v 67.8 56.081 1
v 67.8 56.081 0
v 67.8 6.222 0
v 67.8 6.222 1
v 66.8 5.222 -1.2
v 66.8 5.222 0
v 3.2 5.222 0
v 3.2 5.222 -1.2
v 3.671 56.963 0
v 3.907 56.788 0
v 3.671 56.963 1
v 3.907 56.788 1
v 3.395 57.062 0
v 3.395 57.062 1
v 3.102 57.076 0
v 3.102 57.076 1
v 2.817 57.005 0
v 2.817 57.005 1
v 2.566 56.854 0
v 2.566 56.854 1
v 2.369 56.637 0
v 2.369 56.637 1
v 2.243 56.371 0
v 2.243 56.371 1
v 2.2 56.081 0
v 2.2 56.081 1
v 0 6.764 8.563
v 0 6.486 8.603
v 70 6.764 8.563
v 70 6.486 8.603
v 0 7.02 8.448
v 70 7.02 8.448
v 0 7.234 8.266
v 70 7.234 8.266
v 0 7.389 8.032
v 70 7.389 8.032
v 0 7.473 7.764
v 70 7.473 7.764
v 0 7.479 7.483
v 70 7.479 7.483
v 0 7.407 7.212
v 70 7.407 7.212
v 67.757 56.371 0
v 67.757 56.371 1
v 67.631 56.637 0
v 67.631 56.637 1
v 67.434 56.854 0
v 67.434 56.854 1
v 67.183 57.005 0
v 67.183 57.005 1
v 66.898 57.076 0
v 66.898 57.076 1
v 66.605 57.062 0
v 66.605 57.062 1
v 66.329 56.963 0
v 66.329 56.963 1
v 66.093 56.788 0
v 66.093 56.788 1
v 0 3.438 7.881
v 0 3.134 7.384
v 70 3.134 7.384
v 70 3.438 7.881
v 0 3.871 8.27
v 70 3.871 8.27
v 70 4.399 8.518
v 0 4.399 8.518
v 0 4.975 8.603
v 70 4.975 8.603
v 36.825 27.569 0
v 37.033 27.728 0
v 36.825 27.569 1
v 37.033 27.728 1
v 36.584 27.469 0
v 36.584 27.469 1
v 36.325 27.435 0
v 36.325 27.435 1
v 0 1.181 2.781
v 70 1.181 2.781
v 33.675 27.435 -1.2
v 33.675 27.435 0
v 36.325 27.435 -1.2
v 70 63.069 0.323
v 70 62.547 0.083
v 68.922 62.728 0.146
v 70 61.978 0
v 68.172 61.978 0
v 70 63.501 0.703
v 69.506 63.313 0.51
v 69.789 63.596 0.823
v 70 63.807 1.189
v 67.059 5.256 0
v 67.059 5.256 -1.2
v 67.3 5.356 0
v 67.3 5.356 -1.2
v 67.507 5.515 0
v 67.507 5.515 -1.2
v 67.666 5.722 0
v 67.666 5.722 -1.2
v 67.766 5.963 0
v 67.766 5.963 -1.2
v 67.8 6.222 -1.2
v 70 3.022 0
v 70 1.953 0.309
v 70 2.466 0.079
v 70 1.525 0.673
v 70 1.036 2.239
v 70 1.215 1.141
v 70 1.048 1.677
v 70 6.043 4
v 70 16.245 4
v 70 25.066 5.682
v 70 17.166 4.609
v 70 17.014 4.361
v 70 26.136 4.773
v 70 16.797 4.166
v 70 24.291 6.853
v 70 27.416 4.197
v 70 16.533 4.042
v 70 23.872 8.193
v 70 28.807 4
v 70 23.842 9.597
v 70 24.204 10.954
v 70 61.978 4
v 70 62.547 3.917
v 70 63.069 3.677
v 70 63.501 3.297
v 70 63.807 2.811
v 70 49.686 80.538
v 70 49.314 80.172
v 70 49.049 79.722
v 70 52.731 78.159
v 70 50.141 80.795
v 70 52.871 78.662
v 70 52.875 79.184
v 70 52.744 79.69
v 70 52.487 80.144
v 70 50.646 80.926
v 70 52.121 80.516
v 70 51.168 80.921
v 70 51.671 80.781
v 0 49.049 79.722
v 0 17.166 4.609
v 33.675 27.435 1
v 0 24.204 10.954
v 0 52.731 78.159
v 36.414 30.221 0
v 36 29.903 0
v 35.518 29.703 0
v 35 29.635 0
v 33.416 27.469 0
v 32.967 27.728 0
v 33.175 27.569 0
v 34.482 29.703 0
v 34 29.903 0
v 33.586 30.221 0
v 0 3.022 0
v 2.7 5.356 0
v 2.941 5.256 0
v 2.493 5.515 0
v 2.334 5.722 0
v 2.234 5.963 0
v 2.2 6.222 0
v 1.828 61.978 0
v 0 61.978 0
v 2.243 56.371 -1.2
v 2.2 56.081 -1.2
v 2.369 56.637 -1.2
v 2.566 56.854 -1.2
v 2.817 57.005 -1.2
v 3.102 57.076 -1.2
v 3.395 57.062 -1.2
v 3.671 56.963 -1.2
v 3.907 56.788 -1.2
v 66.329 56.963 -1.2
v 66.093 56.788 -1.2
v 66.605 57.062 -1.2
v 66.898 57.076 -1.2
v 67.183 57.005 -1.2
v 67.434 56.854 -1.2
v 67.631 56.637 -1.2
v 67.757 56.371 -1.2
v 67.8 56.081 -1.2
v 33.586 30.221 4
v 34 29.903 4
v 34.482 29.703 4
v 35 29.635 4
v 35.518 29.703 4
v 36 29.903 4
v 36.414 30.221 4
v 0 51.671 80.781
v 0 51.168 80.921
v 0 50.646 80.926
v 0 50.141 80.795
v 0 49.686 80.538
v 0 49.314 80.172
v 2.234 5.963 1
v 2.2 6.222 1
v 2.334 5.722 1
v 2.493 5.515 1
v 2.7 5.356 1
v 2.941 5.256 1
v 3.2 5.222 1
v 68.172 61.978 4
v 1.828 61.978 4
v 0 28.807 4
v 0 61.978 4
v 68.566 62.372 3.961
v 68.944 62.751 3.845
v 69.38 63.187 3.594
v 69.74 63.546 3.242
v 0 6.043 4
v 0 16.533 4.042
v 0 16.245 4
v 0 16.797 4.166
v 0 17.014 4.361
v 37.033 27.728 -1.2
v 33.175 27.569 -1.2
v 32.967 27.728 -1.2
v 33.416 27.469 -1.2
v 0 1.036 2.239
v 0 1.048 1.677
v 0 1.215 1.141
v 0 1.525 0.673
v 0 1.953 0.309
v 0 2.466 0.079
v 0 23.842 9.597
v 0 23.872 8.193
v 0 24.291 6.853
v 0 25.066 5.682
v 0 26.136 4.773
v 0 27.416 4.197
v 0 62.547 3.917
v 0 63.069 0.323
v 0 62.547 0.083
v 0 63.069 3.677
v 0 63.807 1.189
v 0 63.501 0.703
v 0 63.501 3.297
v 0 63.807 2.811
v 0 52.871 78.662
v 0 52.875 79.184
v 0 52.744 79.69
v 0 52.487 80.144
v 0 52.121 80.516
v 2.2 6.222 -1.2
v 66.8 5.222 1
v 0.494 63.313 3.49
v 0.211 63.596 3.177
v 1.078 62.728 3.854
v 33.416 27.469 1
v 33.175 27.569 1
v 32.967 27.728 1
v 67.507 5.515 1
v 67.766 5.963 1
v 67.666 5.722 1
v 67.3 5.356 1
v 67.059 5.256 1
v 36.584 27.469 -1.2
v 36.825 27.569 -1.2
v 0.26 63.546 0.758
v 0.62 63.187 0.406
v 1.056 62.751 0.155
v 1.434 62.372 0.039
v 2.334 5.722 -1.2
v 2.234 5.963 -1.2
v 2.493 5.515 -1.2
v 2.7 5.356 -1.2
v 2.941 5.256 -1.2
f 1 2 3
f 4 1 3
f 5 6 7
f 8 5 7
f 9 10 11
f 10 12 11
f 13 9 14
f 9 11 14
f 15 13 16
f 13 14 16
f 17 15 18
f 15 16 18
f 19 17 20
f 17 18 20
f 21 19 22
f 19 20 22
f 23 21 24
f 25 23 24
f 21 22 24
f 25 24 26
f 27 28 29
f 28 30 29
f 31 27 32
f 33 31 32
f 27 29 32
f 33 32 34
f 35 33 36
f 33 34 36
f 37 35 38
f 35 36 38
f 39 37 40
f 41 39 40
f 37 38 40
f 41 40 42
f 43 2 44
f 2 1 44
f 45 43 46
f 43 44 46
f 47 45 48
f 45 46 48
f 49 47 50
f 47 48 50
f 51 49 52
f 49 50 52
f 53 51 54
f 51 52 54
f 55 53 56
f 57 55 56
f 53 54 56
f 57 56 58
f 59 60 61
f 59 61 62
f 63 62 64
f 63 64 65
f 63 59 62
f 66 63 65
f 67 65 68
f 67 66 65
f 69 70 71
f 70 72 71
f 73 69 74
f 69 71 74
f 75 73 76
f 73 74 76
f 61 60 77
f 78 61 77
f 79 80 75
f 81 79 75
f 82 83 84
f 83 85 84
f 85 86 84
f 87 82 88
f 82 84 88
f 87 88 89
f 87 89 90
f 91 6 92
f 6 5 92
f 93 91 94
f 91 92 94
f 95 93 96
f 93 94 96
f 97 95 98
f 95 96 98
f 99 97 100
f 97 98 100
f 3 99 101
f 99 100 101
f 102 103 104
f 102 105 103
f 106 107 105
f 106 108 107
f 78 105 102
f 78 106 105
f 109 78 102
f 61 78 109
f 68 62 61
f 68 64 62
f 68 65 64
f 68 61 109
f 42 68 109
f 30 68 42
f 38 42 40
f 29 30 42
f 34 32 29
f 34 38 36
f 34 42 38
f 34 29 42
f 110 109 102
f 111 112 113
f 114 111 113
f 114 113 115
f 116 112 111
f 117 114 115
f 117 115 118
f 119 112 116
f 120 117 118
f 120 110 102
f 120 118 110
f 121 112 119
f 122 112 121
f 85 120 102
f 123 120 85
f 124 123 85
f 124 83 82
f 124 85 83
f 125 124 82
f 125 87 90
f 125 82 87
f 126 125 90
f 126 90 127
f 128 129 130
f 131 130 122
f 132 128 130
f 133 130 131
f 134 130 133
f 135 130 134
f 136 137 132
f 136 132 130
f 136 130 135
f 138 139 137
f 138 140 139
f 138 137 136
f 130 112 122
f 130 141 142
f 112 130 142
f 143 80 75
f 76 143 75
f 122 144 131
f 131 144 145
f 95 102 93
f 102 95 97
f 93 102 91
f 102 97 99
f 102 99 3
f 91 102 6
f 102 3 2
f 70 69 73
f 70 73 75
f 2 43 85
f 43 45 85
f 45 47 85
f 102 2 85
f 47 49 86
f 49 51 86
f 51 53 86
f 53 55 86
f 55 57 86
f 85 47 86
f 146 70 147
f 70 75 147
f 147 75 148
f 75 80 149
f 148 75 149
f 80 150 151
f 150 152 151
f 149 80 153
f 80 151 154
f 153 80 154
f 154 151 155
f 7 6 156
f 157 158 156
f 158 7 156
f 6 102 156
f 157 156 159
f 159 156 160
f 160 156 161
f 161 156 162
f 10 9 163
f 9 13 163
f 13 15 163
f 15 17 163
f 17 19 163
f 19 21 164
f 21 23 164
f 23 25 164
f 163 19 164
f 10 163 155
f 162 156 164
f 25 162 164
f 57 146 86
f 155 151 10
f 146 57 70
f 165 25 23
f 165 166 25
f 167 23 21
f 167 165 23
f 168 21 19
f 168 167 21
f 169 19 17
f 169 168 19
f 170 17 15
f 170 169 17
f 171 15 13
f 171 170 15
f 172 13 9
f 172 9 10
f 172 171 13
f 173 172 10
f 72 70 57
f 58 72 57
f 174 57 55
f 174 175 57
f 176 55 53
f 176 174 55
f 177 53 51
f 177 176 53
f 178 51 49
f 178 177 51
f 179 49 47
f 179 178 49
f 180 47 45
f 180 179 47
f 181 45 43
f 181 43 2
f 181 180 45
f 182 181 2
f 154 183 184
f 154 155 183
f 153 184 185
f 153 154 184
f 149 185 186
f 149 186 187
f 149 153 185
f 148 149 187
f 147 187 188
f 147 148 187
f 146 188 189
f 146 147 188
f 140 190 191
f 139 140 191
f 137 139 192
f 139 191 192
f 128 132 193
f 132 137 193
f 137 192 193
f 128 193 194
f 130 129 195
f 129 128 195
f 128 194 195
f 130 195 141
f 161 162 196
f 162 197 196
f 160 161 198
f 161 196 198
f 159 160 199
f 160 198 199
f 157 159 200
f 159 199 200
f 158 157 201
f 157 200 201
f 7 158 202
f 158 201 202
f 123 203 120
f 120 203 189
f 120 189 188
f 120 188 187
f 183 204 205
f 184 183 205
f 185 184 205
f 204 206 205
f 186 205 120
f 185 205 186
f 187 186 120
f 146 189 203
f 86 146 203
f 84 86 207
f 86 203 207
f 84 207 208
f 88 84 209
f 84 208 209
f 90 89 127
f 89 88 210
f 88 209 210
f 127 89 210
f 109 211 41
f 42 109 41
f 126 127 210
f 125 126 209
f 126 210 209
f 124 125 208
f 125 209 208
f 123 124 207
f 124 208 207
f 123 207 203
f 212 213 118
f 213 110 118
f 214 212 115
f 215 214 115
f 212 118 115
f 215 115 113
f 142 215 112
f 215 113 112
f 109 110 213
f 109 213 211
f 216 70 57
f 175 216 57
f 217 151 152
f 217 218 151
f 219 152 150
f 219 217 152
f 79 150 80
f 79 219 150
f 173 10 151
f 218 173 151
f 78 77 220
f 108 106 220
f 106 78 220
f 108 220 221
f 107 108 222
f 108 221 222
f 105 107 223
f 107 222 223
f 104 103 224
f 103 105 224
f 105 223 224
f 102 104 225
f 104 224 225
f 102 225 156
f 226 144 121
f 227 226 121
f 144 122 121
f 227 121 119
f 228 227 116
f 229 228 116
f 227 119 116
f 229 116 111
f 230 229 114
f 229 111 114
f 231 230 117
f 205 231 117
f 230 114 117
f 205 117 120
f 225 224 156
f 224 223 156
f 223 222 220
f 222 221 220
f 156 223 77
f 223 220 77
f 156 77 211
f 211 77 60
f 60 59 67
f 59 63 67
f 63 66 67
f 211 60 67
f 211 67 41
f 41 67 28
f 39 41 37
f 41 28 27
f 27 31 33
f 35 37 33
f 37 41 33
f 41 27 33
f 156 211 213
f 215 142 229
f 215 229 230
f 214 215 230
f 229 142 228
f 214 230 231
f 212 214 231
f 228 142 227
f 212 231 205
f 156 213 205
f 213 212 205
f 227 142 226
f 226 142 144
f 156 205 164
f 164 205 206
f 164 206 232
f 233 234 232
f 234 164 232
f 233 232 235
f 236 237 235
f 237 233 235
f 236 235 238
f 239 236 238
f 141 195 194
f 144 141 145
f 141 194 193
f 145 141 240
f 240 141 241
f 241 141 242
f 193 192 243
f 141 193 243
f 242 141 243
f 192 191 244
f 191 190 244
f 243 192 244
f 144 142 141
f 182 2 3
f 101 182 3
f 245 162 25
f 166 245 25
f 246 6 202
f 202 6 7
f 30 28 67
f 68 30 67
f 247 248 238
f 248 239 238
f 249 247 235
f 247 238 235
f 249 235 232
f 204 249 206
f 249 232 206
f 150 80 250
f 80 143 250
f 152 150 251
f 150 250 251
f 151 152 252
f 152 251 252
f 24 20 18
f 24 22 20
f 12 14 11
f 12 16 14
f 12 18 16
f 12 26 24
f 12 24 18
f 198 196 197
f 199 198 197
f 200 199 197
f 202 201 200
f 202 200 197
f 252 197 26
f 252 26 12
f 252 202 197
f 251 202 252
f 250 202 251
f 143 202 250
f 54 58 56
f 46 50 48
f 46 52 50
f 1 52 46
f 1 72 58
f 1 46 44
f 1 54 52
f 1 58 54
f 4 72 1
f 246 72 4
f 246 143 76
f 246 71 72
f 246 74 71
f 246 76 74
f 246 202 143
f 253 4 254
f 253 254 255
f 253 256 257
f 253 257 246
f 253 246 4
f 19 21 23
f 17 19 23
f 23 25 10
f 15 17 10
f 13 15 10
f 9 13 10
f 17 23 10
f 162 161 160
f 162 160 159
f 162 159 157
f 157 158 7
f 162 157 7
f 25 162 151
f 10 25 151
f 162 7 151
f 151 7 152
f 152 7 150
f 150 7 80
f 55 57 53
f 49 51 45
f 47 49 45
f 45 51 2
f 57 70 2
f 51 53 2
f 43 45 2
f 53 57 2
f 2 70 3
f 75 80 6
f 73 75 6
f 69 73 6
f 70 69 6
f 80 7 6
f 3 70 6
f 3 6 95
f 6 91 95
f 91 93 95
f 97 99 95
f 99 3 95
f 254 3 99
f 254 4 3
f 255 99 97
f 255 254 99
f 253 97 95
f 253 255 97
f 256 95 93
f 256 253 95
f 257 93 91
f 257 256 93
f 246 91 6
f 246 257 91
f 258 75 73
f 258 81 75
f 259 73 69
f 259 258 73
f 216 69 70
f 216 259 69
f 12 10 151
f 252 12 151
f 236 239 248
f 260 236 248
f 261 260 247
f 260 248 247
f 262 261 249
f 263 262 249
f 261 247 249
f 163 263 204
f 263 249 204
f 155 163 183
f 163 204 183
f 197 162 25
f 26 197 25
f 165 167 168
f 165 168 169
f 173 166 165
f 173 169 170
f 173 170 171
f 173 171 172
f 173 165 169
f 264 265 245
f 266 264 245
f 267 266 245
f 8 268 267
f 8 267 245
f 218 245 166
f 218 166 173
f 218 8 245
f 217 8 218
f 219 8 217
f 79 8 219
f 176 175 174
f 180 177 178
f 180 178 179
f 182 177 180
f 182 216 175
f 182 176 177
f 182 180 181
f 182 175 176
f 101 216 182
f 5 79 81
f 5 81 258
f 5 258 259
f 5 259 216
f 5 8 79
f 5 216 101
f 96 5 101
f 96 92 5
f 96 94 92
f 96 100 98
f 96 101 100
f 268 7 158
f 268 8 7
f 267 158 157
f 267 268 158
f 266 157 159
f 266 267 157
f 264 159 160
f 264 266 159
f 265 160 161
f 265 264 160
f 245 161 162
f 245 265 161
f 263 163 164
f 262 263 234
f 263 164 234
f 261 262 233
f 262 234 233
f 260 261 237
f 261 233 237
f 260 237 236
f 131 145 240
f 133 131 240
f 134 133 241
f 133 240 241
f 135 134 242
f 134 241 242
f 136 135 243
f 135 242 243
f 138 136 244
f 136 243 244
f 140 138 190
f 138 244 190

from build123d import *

# Parameters (mm, degrees)
F1_DEPTH    = 70
F2_T1_DEPTH = 80
F2_T3_DEPTH = 76.618855612
F2_T5_DEPTH = 85.1083519361
F3_R        = 1
F4_R        = 5
F6_DEPTH    = 4
F7_R        = 2
F9_DEPTH    = 1
F10_DEPTH   = 1.2
F11_R       = 1
F11_2_R     = 1


# Not quite as in the source:
# - a fillet or chamfer that OpenCascade refuses, or shapes differently, is made with other operations: its cross-section is extruded or revolved along the edge and cut away or added
# - two fillets or chamfers of one size are made in one step


with BuildPart() as f1:
    # F0 (on Right) → F1 (new body)
    with BuildSketch(Plane.YZ):
        Polygon((3.6515549073, 8.6025242673), (0, 0), (65, 0), (63.3021007352, 4), (21.2523860581, 4), (53.5124720901, 80), (49.8304526763, 81.562924514), (16.9069445485, 4), (6.0433407745, 4), (7.9969964169, 8.6025242673), align=None)
    extrude(amount=F1_DEPTH)

    # F2: fillet of radius 2 on 6 edges, made by hand

    # F2_s2 → F2_t1 (cut)
    with BuildSketch(Plane.YZ.offset(-5)):
        with BuildLine():
            ThreePointArc((51.6714623832, 80.781462257), (50.1407869393, 80.7948202592), (49.0489904193, 79.7219148071))
            Line((49.0489904193, 79.7219148071), (49.8304526763, 81.562924514))
            Line((49.8304526763, 81.562924514), (51.6714623832, 80.781462257))
        make_face()
        with BuildLine():
            ThreePointArc((52.7310098331, 78.1589902931), (52.7443678353, 79.6896657369), (51.6714623832, 80.781462257))
            Line((51.6714623832, 80.781462257), (53.5124720901, 80))
            Line((53.5124720901, 80), (52.7310098331, 78.1589902931))
        make_face()
    extrude(amount=F2_T1_DEPTH, mode=Mode.SUBTRACT)

    # F2_s4 → F2_t3 (cut)
    with BuildSketch(Plane.YZ.offset(-3.309427806)):
        with BuildLine():
            ThreePointArc((3.1343163228, 7.3839865242), (3.8714520591, 8.2702959114), (4.9753260297, 8.6025242673))
            Line((4.9753260297, 8.6025242673), (3.6515549073, 8.6025242673))
            Line((3.6515549073, 8.6025242673), (3.1343163228, 7.3839865242))
        make_face()
        with BuildLine():
            ThreePointArc((63.8193393197, 2.781462257), (63.0822035834, 3.6677716441), (61.9783296128, 4))
            Line((61.9783296128, 4), (63.3021007352, 4))
            Line((63.3021007352, 4), (63.8193393197, 2.781462257))
        make_face()
    extrude(amount=F2_T3_DEPTH, mode=Mode.SUBTRACT)

    # F2_s6 → F2_t5 (cut)
    with BuildSketch(Plane.YZ.offset(-7.5541759681)):
        with BuildLine():
            ThreePointArc((1.1806606803, 2.781462257), (1.3538987431, 0.8961260294), (3.0216703872, 0))
            Line((3.0216703872, 0), (0, 0))
            Line((0, 0), (1.1806606803, 2.781462257))
        make_face()
        with BuildLine():
            ThreePointArc((61.9783296128, 0), (63.6461012569, 0.8961260294), (63.8193393197, 2.781462257))
            Line((63.8193393197, 2.781462257), (65, 0))
            Line((65, 0), (61.9783296128, 0))
        make_face()
    extrude(amount=F2_T5_DEPTH, mode=Mode.SUBTRACT)

    # F3
    f3_edges = [f1.edges().sort_by_distance(p)[0] for p in [
        (35, 7.996996, 8.602524),
        (35, 16.906945, 4),
    ]]
    fillet(f3_edges, radius=F3_R)

    # F4
    f4_edges = [f1.edges().sort_by_distance(p)[0] for p in [
        (35, 21.252386, 4),
    ]]
    fillet(f4_edges, radius=F4_R)

    # F5 (on face) → F6 (cut, through all)
    with BuildSketch(Plane.XY.offset(4)):
        Polygon((1.8282324134, 61.9783296128), (35, 28.8065620262), (68.1717675866, 61.9783296128), (70.1717675866, 63.9783296128), (-0.1717675866, 63.9783296128), align=None)
    extrude(amount=-F6_DEPTH, mode=Mode.SUBTRACT)

    # F7
    f7_edges = [f1.edges().sort_by_distance(p)[0] for p in [
        (35, 28.806562, 2),
    ]]
    fillet(f7_edges, radius=F7_R)

    # F8 (on face) → F9 (cut)
    with BuildSketch(Plane(origin=(0, 0, 0), x_dir=(1, 0, 0), z_dir=(0, 0, -1))):
        Polygon((67.8, -5.2216703872), (2.2, -5.2216703872), (2.2, -58.495292189), (33.260303038, -27.434989151), (36.739696962, -27.434989151), (67.8, -58.495292189), align=None)
    extrude(amount=-F9_DEPTH, mode=Mode.SUBTRACT)

    # F11#2
    f11_2_edges = [f1.edges().sort_by_distance(p)[0] for p in [
        (67.8, 58.495292, 0.5),
        (67.8, 5.22167, 0.5),
        (2.2, 5.22167, 0.5),
        (2.2, 58.495292, 0.5),
        (33.260303, 27.434989, 0.5),
        (36.739697, 27.434989, 0.5),
    ]]
    fillet(f11_2_edges, radius=F11_2_R)


with BuildPart() as f10:
    # F8 (on face) → F10 (new body)
    with BuildSketch(Plane(origin=(0, 0, 0), x_dir=(1, 0, 0), z_dir=(0, 0, -1))):
        Polygon((67.8, -5.2216703872), (2.2, -5.2216703872), (2.2, -58.495292189), (33.260303038, -27.434989151), (36.739696962, -27.434989151), (67.8, -58.495292189), align=None)
    extrude(amount=F10_DEPTH)

    # F11
    f11_edges = [f10.edges().sort_by_distance(p)[0] for p in [
        (2.2, 5.22167, -0.6),
        (33.260303, 27.434989, -0.6),
        (36.739697, 27.434989, -0.6),
        (67.8, 5.22167, -0.6),
        (67.8, 58.495292, -0.6),
        (2.2, 58.495292, -0.6),
    ]]
    fillet(f11_edges, radius=F11_R)


solid = Compound([f1.part, f10.part])
